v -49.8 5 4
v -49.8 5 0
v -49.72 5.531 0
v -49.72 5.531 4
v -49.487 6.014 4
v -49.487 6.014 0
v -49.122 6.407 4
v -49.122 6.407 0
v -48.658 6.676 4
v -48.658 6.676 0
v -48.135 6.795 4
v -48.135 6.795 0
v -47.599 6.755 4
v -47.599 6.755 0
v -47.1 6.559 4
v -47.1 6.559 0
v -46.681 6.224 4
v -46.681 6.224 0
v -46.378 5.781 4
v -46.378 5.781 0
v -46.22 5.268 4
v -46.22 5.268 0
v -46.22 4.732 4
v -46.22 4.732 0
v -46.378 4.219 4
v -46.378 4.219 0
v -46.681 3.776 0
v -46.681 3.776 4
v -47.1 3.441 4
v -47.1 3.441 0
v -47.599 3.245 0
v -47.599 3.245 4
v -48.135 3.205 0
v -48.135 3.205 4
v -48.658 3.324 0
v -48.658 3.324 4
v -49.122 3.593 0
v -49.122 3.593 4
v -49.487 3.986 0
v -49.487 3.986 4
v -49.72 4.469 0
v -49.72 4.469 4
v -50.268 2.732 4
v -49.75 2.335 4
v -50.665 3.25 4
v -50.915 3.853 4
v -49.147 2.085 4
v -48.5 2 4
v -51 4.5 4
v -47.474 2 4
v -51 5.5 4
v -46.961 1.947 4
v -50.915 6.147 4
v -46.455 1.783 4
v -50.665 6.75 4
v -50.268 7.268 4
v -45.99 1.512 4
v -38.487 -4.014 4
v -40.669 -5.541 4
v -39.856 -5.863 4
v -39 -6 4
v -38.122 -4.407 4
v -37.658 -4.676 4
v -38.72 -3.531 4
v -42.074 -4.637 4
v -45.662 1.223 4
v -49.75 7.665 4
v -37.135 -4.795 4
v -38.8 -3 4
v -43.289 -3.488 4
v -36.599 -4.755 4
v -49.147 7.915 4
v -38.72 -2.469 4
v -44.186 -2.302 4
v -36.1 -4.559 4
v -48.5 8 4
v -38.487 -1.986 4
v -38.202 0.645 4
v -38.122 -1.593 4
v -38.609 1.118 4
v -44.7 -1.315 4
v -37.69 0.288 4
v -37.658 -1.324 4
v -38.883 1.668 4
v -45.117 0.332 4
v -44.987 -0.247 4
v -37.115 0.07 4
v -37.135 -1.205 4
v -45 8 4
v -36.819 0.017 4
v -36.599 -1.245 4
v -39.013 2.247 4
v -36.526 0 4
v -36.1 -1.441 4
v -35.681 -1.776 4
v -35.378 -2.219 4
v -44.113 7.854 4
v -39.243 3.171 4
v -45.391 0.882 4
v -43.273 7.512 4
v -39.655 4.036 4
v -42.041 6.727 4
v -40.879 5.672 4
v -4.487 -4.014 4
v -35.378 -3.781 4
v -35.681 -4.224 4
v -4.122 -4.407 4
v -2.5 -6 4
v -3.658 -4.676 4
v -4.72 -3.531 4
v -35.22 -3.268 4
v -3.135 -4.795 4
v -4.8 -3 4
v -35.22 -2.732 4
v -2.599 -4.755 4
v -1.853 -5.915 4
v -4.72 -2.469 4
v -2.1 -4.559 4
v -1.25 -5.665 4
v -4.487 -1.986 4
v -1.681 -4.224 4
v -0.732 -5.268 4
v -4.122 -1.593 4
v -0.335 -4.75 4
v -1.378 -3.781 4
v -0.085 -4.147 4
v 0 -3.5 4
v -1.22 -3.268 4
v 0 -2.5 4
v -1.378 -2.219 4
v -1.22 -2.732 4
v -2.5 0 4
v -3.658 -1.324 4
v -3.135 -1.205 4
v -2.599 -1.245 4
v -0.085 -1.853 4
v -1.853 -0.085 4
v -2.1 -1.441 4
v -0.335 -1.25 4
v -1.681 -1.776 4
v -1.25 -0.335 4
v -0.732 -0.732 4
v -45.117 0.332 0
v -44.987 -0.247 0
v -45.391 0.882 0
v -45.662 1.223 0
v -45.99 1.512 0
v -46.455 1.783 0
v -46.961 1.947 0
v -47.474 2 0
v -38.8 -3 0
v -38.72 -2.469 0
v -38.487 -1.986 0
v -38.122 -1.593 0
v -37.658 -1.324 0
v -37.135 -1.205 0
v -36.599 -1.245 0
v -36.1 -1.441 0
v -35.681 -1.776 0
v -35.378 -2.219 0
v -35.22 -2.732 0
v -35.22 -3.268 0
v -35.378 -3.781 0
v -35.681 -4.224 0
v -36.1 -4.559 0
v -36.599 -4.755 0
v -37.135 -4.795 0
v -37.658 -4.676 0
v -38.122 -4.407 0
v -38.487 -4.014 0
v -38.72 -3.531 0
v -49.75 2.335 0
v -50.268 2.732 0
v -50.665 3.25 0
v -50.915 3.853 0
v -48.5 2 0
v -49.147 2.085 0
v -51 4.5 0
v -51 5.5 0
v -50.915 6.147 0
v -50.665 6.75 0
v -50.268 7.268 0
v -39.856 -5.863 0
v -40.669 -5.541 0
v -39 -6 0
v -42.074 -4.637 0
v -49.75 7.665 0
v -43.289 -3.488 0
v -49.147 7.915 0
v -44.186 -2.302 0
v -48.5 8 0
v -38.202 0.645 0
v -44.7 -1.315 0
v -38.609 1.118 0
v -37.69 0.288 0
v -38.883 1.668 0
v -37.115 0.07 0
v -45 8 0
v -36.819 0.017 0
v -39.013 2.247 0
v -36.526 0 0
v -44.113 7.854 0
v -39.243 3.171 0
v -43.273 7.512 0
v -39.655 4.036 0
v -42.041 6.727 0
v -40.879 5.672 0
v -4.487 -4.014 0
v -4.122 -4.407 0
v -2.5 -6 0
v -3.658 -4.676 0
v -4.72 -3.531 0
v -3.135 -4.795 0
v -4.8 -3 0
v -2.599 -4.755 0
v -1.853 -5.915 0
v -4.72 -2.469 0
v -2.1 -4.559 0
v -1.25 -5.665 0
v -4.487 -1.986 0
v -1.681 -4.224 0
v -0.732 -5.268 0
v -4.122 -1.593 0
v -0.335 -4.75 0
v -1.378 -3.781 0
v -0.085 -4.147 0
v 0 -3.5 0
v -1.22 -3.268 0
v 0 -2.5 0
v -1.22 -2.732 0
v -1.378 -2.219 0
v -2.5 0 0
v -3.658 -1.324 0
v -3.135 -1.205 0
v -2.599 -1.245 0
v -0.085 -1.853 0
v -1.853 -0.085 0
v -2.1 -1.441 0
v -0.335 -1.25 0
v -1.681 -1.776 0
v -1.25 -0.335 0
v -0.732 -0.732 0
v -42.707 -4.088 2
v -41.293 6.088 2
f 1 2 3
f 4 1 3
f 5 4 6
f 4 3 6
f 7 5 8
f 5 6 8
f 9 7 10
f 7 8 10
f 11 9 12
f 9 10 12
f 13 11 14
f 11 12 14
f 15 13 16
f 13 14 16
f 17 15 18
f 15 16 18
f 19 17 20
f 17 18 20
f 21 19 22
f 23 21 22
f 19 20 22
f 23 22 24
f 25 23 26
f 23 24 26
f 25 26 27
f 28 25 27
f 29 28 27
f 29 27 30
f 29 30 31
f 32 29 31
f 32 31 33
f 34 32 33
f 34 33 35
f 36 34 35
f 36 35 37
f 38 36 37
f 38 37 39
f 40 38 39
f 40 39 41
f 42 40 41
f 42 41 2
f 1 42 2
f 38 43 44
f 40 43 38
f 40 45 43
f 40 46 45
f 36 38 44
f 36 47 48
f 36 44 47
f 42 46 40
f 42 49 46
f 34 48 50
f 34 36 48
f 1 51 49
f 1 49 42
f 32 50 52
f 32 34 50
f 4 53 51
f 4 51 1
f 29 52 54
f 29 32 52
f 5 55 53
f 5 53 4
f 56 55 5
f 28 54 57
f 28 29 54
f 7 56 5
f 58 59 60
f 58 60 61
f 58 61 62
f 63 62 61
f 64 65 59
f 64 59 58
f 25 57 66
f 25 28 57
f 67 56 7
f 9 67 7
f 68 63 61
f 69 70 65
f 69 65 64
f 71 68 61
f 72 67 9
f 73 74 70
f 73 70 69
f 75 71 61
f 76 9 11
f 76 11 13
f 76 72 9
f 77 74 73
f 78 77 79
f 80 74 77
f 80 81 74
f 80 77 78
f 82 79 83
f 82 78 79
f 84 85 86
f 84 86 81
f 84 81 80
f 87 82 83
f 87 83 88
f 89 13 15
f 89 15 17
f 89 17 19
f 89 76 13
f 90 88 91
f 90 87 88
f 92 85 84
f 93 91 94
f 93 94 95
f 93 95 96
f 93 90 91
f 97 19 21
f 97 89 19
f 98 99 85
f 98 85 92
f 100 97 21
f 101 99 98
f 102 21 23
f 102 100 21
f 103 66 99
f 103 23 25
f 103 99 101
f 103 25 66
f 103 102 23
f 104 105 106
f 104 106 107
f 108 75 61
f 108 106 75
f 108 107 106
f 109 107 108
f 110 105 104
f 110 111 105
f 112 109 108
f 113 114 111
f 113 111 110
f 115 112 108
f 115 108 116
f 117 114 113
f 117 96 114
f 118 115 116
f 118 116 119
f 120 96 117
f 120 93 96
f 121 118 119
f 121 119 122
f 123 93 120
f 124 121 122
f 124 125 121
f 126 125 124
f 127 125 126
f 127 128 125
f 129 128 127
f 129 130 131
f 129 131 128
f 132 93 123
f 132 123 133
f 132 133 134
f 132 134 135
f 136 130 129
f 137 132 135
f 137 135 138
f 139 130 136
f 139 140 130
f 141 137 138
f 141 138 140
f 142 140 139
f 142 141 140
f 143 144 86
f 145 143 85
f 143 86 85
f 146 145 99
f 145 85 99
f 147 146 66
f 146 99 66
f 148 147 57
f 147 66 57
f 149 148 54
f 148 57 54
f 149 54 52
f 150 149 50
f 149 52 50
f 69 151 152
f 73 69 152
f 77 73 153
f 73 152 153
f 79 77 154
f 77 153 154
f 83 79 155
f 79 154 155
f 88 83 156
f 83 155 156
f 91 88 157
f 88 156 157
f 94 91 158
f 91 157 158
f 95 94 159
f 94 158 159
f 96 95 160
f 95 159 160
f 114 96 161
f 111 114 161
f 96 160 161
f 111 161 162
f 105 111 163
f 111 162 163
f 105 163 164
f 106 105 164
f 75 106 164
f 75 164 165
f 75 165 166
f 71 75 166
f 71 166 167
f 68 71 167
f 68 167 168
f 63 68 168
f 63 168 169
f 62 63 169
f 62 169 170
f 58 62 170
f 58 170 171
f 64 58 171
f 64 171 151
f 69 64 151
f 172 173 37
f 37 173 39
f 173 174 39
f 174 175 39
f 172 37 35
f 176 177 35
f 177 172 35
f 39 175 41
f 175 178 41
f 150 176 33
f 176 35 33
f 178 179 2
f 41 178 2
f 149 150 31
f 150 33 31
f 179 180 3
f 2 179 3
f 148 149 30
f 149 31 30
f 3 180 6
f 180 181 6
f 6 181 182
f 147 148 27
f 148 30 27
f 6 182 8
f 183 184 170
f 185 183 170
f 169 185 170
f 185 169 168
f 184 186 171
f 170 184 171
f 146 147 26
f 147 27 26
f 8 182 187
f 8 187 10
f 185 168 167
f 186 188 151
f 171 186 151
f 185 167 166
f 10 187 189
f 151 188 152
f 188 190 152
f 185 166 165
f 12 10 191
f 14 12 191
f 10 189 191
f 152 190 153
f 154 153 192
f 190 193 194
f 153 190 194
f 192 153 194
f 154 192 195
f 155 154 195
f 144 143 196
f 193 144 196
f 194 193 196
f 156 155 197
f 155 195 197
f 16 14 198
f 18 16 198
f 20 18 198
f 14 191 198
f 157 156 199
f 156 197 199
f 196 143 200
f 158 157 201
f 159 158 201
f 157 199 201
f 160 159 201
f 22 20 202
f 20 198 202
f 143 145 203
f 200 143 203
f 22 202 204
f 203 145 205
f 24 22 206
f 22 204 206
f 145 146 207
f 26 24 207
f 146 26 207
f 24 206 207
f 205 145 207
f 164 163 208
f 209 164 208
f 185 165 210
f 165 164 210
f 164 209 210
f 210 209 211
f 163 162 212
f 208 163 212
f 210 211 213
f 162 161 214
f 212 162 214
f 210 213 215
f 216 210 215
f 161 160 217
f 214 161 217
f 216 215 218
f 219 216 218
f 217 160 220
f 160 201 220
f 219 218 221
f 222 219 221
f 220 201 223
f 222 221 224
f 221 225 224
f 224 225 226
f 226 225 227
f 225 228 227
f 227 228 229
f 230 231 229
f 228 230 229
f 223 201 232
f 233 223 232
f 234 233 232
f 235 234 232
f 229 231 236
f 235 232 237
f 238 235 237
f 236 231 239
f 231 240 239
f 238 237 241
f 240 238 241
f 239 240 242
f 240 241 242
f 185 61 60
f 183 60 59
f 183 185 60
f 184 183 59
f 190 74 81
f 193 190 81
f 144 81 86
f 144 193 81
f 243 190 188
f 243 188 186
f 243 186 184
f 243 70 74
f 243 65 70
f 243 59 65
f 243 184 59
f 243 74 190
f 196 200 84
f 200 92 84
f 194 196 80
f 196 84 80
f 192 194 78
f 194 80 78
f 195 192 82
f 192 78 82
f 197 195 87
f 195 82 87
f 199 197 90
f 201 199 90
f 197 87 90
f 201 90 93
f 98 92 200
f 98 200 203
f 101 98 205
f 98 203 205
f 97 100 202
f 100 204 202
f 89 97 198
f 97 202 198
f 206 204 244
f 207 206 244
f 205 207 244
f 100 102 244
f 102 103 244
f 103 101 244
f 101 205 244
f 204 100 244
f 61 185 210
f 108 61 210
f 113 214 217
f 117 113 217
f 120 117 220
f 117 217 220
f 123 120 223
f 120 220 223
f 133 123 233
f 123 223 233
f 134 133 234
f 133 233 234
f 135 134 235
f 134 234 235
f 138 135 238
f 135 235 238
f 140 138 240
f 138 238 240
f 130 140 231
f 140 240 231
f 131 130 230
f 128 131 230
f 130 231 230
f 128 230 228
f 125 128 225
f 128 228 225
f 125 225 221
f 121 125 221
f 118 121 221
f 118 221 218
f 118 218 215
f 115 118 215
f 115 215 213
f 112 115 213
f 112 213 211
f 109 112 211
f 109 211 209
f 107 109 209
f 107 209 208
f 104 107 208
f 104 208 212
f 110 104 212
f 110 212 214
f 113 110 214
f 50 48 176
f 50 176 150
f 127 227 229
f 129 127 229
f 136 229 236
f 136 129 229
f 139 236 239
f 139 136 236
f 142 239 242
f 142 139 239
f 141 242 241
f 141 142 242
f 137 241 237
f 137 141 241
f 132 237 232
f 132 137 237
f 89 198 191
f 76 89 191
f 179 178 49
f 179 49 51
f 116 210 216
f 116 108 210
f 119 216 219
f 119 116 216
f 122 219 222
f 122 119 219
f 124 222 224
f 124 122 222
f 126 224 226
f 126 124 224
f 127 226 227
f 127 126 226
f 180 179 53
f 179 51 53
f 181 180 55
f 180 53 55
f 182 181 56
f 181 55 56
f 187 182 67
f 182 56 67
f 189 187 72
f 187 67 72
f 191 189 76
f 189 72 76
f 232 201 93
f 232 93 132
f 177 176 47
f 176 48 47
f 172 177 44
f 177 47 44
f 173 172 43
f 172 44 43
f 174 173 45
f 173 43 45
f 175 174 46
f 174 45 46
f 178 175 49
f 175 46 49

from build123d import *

# Parameters (mm, degrees)
SKETCH1_W           = 45
SKETCH1_H           = 6
SKETCH1_W_2         = 6
BOSS_EXTRUDE1_DEPTH = 4
SKETCH2_R           = 1.8
CUT_EXTRUDE1_DEPTH  = 52.778373864
FILLET2_SIZE        = 6
FILLET3_R           = 2.5


with BuildPart() as part:
    # Sketch1 → Boss-Extrude1 (new body)
    with BuildSketch(Plane.XY):
        with Locations((-22.5, -3)):
            Rectangle(SKETCH1_W, SKETCH1_H)
        Polygon((-45, 0), (-39, 0), (-39, 8), (-45, 8), (-45, 2), align=None)
        with Locations((-48, 5)):
            Rectangle(SKETCH1_W_2, SKETCH1_H)
    extrude(amount=BOSS_EXTRUDE1_DEPTH)

    # Sketch2 → Cut-Extrude1 (cut, through all)
    with BuildSketch(Plane(origin=(0, 0, 0), x_dir=(-1, 0, 0), z_dir=(0, 0, -1))):
        with Locations((3, -3)):
            Circle(SKETCH2_R)
        with Locations((37, -3)):
            Circle(SKETCH2_R)
        with Locations((48, 5)):
            Circle(SKETCH2_R)
    extrude(amount=-CUT_EXTRUDE1_DEPTH, mode=Mode.SUBTRACT)

    # Fillet2
    # a fillet whose section is not a circle: 6 mm, written as the material it takes off along each edge
    with BuildSketch(Plane(origin=(-45, -6, -15), x_dir=(1, 0, 0), z_dir=(0, 0, 1))) as fillet2_piece_1:
        with BuildLine():
            Bezier((FILLET2_SIZE, 0), (0, 0), (0, FILLET2_SIZE), weights=[1, 0.428571429, 1])
            Line((0, FILLET2_SIZE), (0, 0))
            Line((0, 0), (FILLET2_SIZE, 0))
        make_face()
    extrude(amount=34, mode=Mode.SUBTRACT)
    with BuildSketch(Plane(origin=(-39, 8, -15), x_dir=(0, -1, 0), z_dir=(0, 0, 1))) as fillet2_piece_2:
        with BuildLine():
            Bezier((FILLET2_SIZE, 0), (0, 0), (0, -FILLET2_SIZE), weights=[1, 0.428571429, 1])
            Line((0, -FILLET2_SIZE), (0, 0))
            Line((0, 0), (FILLET2_SIZE, 0))
        make_face()
    extrude(amount=34, mode=Mode.SUBTRACT)

    # Fillet3
    fillet3_edges = [part.edges().sort_by_distance(p)[0] for p in [
        (-51, 8, 2),
        (-51, 2, 2),
        (-45, 2, 2),
        (-39, 0, 2),
        (0, 0, 2),
        (0, -6, 2),
    ]]
    fillet(fillet3_edges, radius=FILLET3_R)


solid = part.part
